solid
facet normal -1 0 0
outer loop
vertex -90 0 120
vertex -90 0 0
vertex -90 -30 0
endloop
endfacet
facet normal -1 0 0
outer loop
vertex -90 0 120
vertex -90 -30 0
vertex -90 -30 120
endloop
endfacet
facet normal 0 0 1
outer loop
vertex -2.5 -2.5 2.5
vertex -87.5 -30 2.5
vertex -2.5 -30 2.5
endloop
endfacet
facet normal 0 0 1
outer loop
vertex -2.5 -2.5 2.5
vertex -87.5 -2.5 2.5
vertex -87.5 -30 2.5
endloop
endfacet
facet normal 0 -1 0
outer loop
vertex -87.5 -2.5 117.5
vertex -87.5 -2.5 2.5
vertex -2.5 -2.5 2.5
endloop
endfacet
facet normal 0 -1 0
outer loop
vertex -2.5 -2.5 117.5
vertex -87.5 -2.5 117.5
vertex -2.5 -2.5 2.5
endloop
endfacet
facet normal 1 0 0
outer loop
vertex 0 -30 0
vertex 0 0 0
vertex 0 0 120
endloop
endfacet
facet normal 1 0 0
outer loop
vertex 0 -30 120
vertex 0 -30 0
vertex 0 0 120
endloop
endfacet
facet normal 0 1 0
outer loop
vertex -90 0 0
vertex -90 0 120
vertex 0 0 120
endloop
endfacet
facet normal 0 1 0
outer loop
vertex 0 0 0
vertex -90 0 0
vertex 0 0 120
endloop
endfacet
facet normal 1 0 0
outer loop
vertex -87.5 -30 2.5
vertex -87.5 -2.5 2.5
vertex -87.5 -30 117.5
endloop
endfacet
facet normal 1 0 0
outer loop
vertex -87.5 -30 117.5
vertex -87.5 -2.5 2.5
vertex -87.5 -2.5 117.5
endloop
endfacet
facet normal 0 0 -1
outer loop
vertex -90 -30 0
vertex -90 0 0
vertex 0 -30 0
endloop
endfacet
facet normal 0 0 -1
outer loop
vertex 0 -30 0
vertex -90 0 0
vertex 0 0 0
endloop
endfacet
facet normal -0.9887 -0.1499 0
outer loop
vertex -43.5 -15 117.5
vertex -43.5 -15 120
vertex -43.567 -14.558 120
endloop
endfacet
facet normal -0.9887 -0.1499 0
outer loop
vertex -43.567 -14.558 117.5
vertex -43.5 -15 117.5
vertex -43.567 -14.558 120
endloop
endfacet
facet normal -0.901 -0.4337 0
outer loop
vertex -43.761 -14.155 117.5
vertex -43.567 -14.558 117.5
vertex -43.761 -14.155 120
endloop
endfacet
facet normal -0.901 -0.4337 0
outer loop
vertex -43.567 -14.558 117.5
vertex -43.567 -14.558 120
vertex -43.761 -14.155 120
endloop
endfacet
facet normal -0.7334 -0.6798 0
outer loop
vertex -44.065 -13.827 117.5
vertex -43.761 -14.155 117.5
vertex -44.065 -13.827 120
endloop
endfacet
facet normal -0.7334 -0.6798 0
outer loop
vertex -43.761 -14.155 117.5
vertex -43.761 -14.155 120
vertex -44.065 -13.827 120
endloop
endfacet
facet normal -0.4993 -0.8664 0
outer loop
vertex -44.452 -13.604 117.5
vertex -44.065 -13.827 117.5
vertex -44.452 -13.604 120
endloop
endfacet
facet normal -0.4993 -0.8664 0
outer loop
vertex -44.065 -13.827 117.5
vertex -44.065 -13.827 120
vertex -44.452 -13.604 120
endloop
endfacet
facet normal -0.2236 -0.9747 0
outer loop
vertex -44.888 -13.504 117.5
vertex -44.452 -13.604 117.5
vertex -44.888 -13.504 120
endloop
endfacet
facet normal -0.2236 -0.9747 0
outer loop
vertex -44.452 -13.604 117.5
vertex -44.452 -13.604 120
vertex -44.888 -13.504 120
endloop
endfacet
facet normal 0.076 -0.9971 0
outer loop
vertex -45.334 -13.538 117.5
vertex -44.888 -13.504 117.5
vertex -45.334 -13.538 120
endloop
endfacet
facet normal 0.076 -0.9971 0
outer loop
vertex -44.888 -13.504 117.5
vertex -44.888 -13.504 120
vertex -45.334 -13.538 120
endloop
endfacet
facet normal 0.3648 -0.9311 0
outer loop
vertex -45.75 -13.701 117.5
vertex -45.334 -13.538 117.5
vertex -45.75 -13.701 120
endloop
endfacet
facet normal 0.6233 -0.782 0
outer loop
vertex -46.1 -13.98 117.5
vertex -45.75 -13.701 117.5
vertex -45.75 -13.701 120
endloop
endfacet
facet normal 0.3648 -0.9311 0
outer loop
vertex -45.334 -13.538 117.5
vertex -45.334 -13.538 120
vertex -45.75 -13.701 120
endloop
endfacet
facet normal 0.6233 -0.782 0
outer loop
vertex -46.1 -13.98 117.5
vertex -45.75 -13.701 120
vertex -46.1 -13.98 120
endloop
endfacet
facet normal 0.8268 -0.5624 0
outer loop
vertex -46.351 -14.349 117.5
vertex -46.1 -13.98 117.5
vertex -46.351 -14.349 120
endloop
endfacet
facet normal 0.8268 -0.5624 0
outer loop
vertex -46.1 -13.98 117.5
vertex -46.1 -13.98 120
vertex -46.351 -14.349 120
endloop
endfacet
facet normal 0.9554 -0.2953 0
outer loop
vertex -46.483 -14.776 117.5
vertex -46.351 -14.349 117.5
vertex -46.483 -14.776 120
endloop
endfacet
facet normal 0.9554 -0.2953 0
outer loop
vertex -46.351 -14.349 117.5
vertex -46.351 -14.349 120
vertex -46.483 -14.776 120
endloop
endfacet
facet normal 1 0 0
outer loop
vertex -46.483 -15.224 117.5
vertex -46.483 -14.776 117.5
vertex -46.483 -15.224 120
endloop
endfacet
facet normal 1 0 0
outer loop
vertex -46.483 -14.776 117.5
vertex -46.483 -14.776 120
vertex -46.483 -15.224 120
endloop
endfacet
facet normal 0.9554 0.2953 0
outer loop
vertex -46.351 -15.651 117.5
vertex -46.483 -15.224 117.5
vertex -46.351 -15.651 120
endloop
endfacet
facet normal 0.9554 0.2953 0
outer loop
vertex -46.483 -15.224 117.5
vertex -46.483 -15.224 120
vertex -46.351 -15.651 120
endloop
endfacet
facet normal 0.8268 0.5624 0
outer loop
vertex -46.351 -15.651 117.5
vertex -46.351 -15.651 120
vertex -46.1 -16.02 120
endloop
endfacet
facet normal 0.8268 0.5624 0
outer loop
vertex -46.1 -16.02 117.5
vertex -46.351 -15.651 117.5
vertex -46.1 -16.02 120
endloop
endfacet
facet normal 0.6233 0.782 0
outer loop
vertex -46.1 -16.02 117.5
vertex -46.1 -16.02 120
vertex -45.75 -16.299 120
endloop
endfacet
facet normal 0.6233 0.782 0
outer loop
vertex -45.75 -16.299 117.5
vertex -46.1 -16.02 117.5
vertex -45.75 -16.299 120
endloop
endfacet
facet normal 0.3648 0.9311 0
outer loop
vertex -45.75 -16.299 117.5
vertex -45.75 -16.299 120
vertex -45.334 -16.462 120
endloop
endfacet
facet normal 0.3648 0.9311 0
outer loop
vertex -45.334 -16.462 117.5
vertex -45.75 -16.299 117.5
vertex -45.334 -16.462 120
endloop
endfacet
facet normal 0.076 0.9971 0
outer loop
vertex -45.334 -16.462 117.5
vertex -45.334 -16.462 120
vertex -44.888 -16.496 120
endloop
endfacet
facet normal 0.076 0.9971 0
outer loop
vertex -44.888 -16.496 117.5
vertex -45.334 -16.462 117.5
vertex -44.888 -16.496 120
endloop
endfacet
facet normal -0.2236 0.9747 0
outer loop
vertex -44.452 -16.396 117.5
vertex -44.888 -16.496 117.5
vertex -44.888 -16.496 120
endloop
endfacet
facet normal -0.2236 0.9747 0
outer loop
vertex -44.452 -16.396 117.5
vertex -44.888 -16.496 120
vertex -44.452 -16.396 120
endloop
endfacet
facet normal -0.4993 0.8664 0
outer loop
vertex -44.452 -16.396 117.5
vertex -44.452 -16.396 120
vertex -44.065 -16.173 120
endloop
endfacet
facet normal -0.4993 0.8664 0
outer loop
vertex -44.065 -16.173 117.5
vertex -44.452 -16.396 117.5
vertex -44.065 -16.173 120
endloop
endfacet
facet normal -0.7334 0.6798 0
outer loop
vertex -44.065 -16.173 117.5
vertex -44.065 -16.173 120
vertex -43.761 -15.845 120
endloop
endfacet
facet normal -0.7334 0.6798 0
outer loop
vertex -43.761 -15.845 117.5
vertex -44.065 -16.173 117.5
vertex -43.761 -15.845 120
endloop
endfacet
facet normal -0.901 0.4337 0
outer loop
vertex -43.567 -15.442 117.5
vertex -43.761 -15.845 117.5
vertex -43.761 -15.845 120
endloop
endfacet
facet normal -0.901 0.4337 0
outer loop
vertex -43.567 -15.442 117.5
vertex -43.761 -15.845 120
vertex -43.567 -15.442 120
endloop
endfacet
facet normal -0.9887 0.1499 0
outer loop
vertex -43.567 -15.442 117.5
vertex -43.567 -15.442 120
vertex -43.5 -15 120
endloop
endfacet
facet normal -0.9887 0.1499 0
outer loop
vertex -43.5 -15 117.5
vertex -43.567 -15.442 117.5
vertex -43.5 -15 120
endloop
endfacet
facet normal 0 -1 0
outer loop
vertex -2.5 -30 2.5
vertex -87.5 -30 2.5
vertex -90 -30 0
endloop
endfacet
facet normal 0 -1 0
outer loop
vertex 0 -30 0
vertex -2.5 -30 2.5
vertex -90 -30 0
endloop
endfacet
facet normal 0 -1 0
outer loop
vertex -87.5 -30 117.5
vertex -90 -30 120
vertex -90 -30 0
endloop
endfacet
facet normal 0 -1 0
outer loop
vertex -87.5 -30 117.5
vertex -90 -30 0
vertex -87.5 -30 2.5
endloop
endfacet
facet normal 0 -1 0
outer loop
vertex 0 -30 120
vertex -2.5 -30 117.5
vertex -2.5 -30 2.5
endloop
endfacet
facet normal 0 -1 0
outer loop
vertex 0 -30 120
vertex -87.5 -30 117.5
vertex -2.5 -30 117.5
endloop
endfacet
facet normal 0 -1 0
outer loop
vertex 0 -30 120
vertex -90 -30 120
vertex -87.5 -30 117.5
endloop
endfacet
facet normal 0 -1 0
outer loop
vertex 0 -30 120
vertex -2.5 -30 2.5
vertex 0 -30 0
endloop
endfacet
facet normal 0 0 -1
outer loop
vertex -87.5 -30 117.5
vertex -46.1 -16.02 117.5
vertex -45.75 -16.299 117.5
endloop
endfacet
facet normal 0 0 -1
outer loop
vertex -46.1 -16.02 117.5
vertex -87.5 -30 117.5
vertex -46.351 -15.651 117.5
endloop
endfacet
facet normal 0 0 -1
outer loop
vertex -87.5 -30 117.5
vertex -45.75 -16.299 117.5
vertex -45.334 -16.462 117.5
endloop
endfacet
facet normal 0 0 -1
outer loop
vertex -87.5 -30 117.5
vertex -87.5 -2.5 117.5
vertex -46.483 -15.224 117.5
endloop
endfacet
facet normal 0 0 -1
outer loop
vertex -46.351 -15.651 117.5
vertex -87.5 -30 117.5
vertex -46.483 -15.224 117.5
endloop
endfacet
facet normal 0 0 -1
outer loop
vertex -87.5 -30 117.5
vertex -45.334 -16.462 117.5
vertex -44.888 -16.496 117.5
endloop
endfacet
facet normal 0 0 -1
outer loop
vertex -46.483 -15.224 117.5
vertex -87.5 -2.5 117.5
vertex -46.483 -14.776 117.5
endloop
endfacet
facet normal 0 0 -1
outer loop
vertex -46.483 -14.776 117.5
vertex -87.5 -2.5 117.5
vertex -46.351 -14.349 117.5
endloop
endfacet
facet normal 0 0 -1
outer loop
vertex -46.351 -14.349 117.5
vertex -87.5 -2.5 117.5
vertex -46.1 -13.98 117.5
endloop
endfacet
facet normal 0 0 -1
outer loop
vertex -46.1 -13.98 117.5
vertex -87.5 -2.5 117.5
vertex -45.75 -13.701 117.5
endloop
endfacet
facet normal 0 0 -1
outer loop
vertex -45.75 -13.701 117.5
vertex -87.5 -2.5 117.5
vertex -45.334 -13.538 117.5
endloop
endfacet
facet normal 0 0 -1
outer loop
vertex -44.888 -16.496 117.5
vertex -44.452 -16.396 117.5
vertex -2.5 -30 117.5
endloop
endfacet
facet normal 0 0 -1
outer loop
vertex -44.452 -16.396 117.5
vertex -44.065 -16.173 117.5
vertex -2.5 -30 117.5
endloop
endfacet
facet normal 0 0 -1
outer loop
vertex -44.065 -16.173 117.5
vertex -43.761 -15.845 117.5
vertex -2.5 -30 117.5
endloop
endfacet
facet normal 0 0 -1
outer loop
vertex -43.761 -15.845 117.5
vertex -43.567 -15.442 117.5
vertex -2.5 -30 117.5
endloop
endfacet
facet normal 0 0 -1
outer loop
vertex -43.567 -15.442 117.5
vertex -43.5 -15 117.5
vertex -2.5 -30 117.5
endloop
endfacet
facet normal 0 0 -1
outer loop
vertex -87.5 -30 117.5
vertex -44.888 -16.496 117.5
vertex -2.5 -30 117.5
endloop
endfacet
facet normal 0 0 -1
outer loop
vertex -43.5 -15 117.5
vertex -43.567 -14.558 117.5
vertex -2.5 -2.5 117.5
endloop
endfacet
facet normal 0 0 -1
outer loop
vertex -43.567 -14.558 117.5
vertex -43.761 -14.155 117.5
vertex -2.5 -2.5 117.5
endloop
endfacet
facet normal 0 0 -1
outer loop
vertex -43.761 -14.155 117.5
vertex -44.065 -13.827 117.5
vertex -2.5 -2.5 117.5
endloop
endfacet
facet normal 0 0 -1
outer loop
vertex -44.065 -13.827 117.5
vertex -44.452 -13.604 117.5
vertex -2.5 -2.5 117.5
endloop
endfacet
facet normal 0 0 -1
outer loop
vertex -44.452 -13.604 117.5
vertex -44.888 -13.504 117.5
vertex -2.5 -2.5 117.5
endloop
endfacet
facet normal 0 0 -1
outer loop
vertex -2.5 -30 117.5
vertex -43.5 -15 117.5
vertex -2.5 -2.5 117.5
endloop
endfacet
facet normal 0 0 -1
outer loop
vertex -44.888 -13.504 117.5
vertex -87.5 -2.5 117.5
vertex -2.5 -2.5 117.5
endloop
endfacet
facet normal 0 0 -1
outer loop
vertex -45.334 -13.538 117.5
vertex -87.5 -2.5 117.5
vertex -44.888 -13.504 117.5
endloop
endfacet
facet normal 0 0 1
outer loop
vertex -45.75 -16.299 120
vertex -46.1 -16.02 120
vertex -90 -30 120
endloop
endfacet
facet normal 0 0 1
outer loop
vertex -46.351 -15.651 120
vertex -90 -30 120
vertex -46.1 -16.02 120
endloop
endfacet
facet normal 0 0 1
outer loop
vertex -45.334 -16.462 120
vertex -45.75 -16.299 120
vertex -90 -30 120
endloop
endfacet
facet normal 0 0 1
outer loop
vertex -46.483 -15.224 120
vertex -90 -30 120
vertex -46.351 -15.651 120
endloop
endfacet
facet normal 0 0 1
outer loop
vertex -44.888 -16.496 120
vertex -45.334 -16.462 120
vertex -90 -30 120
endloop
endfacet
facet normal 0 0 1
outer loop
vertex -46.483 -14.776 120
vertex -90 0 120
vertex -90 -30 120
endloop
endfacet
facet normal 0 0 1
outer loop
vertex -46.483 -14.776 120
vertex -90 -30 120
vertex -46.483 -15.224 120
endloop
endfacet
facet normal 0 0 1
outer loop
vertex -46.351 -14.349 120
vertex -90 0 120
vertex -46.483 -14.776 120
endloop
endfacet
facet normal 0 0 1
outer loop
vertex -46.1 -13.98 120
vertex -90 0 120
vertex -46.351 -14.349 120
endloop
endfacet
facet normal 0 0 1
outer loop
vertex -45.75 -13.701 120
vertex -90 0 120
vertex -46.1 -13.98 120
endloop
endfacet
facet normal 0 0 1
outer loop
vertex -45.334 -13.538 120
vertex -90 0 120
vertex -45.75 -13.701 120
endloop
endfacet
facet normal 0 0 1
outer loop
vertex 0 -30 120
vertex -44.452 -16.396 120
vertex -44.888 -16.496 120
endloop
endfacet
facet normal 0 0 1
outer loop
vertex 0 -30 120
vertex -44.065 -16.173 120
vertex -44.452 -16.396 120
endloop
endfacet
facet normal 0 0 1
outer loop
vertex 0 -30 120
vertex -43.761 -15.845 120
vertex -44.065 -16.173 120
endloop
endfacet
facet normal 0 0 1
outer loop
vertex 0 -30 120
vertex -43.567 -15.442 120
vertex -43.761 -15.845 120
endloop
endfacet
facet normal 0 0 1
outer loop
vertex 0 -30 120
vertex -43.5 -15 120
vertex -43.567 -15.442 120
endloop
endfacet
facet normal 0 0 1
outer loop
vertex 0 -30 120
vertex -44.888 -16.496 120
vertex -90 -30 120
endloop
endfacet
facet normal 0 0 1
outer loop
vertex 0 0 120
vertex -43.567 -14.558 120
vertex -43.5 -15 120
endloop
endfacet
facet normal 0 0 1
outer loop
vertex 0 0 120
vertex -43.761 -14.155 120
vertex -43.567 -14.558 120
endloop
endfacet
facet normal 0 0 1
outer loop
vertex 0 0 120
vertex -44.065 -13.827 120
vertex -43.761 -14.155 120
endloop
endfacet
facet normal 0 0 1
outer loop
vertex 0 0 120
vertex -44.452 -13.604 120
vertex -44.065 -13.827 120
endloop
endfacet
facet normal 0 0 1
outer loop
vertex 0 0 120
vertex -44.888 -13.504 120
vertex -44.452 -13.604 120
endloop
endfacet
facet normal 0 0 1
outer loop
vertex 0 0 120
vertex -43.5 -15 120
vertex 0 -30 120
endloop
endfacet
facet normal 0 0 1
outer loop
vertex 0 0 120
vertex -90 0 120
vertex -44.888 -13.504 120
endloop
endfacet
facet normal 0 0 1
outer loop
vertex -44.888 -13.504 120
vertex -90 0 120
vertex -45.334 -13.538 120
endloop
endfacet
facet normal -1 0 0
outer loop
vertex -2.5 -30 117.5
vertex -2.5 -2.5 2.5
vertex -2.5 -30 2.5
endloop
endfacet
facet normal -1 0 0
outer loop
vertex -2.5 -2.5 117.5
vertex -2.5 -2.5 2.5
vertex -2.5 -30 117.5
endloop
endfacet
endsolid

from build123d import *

# Parameters (mm, degrees)
F0_W     = 90
F0_H     = 120
F1_DEPTH = 30
F2_T     = -2.5
F3_R     = 1.5
F4_DEPTH = 25


with BuildPart() as f1:
    # F0 (on Front) → F1 (new body)
    with BuildSketch(Plane.XZ):
        with Locations((-45, 60)):
            Rectangle(F0_W, F0_H)
    extrude(amount=F1_DEPTH)

    # F2
    f2_openings = [f1.faces().sort_by_distance(p)[0] for p in [
        (-45, -30, 60),
    ]]
    offset(amount=F2_T, openings=f2_openings)

    # F3 (on face) → F4 (cut)
    with BuildSketch(Plane.XY.offset(120)):
        with Locations((-45, -15)):
            Circle(F3_R)
    extrude(amount=-F4_DEPTH, mode=Mode.SUBTRACT)


solid = f1.part
